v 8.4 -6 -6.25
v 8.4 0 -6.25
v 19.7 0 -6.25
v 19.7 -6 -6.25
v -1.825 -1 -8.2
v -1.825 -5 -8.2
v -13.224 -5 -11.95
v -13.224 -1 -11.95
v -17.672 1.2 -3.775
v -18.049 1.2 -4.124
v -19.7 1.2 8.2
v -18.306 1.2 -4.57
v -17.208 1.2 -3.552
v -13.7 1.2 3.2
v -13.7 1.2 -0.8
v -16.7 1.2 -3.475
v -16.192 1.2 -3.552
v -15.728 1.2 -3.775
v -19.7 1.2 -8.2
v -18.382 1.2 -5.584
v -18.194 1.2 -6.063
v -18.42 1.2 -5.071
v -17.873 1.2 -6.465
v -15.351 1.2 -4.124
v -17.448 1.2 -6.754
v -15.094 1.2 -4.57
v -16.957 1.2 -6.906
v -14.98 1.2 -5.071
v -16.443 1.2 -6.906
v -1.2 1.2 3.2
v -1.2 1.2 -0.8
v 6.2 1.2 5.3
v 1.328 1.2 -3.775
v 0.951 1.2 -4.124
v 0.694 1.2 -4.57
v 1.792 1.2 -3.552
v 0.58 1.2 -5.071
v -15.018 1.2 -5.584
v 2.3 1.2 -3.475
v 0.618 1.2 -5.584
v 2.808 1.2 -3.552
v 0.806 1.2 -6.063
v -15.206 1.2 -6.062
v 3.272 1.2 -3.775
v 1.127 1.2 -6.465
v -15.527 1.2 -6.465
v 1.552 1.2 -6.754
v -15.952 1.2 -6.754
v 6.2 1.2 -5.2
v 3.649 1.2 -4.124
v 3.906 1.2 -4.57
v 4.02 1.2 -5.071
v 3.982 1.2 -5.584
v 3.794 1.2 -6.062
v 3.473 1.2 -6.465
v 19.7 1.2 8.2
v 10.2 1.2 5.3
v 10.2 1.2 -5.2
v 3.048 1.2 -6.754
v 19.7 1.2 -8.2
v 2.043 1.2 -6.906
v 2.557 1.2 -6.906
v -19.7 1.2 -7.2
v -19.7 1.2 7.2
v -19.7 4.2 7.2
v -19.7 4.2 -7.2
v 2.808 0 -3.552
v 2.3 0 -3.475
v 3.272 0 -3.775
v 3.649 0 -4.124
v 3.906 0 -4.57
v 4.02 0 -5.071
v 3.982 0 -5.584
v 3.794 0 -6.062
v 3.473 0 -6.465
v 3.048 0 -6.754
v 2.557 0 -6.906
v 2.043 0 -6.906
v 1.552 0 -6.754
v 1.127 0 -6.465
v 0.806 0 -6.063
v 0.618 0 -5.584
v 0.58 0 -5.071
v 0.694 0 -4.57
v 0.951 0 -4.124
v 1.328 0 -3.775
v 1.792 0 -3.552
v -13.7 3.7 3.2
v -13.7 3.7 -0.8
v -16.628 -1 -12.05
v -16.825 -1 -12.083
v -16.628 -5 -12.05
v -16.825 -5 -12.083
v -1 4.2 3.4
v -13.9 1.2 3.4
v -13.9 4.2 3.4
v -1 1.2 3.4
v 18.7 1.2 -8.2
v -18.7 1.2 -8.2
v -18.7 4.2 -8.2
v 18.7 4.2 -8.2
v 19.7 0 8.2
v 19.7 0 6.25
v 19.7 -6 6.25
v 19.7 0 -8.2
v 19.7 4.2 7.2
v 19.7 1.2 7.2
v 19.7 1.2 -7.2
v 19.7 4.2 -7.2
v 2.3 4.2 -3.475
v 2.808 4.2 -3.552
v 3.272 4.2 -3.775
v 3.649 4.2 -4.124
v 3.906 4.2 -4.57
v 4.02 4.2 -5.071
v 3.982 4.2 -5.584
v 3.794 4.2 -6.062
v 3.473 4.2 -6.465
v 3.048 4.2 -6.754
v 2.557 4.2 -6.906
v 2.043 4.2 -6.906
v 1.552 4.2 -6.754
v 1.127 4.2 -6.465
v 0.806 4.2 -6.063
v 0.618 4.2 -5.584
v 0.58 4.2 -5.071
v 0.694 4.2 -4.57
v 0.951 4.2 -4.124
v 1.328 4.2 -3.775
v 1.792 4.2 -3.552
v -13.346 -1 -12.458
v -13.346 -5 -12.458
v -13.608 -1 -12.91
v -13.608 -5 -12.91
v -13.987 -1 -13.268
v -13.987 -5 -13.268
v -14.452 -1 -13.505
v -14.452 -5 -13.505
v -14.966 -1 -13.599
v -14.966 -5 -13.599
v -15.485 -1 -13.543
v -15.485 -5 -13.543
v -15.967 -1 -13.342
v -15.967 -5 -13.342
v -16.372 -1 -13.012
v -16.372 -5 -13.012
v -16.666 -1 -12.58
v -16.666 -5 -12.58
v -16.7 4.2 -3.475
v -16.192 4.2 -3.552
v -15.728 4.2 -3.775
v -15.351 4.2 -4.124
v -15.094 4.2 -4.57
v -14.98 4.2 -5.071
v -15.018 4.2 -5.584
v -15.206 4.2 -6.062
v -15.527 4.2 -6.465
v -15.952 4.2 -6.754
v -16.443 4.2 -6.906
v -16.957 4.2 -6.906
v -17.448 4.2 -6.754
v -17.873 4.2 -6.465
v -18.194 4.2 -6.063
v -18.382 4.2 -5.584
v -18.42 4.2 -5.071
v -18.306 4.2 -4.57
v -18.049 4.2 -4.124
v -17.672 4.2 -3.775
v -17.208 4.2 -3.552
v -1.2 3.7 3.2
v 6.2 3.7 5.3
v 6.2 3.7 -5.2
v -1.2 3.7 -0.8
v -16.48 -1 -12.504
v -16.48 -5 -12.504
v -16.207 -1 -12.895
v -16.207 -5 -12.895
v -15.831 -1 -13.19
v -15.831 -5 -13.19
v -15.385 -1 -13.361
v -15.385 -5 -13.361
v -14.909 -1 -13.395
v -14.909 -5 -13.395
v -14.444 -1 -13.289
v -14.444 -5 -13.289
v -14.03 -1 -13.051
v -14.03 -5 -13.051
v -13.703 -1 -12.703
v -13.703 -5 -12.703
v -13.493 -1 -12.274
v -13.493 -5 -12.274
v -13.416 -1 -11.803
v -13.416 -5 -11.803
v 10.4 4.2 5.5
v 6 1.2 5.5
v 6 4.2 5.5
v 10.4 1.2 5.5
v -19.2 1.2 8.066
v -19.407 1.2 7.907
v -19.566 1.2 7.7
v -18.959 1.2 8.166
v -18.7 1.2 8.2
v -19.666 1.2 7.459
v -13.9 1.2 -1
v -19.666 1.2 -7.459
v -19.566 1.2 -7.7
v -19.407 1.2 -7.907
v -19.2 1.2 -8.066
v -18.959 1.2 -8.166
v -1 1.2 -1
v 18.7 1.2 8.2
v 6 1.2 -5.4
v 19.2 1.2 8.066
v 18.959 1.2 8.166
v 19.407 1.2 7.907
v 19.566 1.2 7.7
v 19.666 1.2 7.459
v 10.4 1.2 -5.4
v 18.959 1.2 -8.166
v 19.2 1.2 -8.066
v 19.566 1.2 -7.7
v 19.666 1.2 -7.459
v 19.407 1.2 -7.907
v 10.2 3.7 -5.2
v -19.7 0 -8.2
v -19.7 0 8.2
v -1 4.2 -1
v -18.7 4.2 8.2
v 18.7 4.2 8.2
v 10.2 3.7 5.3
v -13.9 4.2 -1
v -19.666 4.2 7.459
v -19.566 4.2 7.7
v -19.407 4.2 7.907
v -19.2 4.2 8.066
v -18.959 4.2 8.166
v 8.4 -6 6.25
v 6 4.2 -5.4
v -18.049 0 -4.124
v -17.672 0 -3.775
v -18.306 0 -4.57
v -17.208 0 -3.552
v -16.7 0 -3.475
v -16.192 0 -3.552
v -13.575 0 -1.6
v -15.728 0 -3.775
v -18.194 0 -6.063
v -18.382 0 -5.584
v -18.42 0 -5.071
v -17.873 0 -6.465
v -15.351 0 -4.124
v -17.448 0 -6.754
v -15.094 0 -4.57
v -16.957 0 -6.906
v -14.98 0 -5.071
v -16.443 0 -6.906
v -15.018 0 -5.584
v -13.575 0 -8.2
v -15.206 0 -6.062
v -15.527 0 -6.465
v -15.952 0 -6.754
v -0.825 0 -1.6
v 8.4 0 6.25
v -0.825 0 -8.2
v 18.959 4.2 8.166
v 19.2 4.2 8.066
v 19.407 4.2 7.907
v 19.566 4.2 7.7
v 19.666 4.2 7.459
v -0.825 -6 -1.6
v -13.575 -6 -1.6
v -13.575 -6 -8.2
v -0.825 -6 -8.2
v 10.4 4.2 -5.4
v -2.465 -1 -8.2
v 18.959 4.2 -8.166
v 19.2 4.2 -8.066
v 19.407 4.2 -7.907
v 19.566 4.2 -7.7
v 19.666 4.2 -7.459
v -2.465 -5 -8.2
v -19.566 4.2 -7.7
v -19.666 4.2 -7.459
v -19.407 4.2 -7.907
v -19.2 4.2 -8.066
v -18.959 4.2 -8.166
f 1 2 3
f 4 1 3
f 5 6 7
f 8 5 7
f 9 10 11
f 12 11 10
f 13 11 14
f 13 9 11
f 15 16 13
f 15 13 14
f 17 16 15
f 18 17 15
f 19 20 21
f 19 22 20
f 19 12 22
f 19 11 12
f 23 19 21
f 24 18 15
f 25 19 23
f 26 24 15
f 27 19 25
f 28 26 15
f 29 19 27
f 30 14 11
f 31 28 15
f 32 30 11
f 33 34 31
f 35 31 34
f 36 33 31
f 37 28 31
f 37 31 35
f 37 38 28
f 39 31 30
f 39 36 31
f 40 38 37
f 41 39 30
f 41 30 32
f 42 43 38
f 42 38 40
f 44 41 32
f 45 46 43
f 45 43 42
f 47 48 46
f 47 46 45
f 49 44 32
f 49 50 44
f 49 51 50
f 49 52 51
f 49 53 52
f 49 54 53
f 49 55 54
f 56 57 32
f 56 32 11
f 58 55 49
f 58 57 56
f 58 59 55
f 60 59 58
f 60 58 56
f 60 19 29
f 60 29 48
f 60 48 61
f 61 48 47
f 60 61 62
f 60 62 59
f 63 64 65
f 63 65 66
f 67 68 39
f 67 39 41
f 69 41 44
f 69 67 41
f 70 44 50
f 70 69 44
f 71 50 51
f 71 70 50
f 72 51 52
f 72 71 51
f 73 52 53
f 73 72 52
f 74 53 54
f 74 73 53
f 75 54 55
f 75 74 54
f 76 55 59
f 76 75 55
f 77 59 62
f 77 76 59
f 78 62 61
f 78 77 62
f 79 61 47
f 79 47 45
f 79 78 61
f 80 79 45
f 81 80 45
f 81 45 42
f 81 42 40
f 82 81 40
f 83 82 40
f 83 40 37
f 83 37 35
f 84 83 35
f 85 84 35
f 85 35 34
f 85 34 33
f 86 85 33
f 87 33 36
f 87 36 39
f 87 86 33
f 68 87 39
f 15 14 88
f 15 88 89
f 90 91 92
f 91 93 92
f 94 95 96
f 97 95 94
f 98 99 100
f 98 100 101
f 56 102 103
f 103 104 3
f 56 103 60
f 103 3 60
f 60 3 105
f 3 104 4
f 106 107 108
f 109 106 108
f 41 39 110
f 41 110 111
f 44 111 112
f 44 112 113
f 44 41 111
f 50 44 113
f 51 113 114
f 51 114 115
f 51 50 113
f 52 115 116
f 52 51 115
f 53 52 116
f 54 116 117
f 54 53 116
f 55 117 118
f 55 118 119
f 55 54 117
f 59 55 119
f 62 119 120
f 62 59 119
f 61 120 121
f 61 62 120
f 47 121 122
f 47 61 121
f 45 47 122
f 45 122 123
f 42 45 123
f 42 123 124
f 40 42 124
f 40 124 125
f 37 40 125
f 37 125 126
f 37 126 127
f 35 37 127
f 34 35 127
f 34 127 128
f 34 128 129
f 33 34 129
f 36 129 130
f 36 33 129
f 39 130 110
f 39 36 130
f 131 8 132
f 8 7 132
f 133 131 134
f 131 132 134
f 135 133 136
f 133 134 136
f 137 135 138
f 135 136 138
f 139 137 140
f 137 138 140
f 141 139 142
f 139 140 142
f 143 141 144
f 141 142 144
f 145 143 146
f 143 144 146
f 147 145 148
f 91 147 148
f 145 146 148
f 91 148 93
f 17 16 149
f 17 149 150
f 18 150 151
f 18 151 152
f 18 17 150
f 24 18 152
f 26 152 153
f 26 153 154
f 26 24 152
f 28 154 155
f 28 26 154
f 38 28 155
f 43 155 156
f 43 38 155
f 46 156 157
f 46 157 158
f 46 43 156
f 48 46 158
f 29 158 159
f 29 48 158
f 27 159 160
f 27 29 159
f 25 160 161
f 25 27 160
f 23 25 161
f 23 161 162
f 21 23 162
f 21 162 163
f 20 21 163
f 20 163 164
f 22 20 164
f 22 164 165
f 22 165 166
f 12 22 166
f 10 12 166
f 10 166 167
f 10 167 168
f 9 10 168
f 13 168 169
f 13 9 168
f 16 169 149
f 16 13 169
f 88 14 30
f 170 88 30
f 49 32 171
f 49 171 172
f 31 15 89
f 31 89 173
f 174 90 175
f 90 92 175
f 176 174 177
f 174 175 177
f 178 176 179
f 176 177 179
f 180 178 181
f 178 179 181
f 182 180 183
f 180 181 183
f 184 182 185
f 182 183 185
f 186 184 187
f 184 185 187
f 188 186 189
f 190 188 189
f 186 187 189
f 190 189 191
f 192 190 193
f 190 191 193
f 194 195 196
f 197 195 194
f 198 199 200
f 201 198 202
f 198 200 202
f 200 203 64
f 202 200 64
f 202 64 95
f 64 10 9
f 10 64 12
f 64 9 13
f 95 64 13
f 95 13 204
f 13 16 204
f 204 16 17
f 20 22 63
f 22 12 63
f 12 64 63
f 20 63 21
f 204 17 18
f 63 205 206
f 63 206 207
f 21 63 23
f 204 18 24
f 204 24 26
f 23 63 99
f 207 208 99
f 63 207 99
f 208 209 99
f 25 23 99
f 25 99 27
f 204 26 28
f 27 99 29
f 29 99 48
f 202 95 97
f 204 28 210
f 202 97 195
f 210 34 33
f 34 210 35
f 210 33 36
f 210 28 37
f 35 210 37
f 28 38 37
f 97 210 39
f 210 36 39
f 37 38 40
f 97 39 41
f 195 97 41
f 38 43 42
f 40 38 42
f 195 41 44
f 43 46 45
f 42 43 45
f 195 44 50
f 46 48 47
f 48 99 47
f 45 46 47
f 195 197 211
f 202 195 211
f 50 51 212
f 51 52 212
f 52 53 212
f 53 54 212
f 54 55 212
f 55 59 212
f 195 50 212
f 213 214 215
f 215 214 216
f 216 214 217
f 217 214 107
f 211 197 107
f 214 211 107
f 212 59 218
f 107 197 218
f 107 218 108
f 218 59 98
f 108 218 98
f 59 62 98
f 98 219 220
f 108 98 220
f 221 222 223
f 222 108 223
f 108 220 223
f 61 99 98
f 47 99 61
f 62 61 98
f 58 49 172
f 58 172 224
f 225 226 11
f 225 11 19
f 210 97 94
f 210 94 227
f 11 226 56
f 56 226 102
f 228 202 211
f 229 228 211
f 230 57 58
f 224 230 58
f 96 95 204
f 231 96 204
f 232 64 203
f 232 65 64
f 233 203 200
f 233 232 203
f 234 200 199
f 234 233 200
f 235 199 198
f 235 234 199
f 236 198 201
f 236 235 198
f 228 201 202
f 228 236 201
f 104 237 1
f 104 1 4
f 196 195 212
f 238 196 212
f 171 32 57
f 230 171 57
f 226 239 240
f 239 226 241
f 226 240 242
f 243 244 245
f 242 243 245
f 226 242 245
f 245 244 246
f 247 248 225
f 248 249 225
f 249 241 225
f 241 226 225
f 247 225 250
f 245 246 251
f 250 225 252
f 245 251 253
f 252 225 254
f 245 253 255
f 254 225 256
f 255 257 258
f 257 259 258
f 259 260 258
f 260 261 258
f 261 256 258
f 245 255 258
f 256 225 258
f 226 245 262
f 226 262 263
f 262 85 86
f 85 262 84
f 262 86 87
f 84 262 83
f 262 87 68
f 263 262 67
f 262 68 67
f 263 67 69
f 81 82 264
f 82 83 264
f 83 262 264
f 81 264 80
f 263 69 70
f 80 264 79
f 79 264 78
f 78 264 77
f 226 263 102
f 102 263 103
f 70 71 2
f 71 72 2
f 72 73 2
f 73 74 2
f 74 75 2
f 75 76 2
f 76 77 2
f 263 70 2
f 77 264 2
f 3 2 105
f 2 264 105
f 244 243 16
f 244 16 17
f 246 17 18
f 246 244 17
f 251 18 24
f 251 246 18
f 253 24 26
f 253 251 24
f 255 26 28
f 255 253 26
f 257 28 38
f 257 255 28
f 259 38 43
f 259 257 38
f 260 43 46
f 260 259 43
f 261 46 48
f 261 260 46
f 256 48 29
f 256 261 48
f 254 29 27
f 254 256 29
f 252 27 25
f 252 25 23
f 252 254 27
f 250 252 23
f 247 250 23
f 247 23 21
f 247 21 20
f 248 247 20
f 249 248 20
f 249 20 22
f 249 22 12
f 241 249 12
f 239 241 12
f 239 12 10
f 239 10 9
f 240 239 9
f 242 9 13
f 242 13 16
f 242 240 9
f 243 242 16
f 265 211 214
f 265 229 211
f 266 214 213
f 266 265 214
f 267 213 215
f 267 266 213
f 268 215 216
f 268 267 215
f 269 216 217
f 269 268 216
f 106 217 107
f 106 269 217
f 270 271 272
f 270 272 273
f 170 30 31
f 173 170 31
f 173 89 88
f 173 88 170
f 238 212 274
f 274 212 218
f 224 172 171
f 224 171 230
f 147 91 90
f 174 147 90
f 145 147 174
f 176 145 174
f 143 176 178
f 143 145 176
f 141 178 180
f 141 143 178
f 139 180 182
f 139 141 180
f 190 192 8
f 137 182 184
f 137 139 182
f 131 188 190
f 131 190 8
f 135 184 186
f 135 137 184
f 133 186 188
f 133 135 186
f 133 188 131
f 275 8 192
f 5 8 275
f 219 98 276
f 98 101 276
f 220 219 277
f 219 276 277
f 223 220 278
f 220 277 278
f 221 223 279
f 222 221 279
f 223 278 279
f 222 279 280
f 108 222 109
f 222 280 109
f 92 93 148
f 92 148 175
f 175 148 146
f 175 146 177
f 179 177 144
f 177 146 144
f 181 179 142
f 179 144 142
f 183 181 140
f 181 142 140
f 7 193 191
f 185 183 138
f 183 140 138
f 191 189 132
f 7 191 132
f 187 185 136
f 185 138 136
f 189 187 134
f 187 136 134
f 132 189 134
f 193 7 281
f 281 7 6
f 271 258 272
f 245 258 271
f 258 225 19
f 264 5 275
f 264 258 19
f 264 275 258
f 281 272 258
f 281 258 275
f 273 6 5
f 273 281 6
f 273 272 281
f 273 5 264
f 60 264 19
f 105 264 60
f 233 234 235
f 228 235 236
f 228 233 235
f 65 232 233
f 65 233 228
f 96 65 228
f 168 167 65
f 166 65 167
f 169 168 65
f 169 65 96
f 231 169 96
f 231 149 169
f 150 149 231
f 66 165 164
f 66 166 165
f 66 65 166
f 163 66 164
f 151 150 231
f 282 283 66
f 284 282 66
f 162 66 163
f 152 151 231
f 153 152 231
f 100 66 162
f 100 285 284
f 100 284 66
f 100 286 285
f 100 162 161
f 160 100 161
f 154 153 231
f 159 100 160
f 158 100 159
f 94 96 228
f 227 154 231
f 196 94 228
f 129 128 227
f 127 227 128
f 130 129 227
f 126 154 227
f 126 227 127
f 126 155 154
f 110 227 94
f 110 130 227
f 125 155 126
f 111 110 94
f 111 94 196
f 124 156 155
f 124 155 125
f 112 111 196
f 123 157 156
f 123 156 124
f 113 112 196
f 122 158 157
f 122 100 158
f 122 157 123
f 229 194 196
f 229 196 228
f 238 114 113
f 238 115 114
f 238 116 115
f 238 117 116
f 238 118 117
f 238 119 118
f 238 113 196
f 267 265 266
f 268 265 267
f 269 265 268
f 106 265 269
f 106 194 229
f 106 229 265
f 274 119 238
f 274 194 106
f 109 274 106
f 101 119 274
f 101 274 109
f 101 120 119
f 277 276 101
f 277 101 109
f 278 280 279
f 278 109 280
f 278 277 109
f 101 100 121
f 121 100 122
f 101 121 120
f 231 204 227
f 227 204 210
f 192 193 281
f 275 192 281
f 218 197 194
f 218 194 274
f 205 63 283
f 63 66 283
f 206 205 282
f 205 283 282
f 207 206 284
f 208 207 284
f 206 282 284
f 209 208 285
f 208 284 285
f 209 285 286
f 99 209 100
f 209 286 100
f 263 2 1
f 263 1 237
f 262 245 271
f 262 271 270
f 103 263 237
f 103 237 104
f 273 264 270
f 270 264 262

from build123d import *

# Parameters (mm, degrees)
SKETCH1_W           = 39.4
SKETCH1_H           = 16.4
SKETCH1_R           = 1.725
BOSS_EXTRUDE1_DEPTH = 1.2
SKETCH2_W           = 12.5
SKETCH2_H           = 4
SKETCH2_W_2         = 4
SKETCH2_H_2         = 10.5
BOSS_EXTRUDE2_DEPTH = 2.5
SKETCH3_W           = 11.3
SKETCH3_H           = 12.5
SKETCH3_W_2         = 12.75
SKETCH3_H_2         = 6.6
BOSS_EXTRUDE3_DEPTH = 6
BOSS_EXTRUDE4_DEPTH = 2
SKETCH5_W           = 39.4
SKETCH5_H           = 16.4
SKETCH5_R           = 1.725
SKETCH5_W_2         = 12.9
SKETCH5_H_2         = 4.4
SKETCH5_W_3         = 4.4
SKETCH5_H_3         = 10.9
BOSS_EXTRUDE5_DEPTH = 3
FILLET1_R           = 1


with BuildPart() as part:
    # Sketch1 → Boss-Extrude1 (new body)
    with BuildSketch(Plane(origin=(0, 0, 0), x_dir=(1, 0, 0), z_dir=(0, 1, 0))):
        Rectangle(SKETCH1_W, SKETCH1_H)
        with Locations(Location((-16.7, 5.2, 0), (0, 0, 270))):
            Circle(SKETCH1_R, mode=Mode.SUBTRACT)
        with Locations(Location((2.3, 5.2, 0), (0, 0, 270))):
            Circle(SKETCH1_R, mode=Mode.SUBTRACT)
    extrude(amount=BOSS_EXTRUDE1_DEPTH)

    # Sketch2 → Boss-Extrude2 (add)
    with BuildSketch(Plane(origin=(0, 1.2, 0), x_dir=(1, 0, 0), z_dir=(0, 1, 0))):
        with Locations((-7.45, -1.2)):
            Rectangle(SKETCH2_W, SKETCH2_H)
        with Locations((8.2, -0.05)):
            Rectangle(SKETCH2_W_2, SKETCH2_H_2)
    extrude(amount=BOSS_EXTRUDE2_DEPTH)

    # Sketch3 → Boss-Extrude3 (add)
    with BuildSketch(Plane.XZ):
        with Locations((14.05, 0)):
            Rectangle(SKETCH3_W, SKETCH3_H)
        with Locations((-7.2, -4.9)):
            Rectangle(SKETCH3_W_2, SKETCH3_H_2)
    extrude(amount=BOSS_EXTRUDE3_DEPTH)

    # Sketch4 → Boss-Extrude4 (add, symmetric)
    with BuildSketch(Plane(origin=(0, -3, 0), x_dir=(-1, 0, 0), z_dir=(0, -1, 0))):
        with BuildLine():
            Line((1.825, 8.2), (13.224013115, 11.95))
            ThreePointArc((13.224013115, 11.95), (14.96605462, 13.598761551), (16.825, 12.083028945))
            Line((16.825, 12.083028945), (16.627742085, 12.050024171))
            ThreePointArc((16.627742085, 12.050024171), (14.909005352, 13.395228648), (13.416459603, 11.802765704))
            Line((13.416459603, 11.802765704), (2.465, 8.2))
            Line((2.465, 8.2), (1.825, 8.2))
        make_face()
    extrude(amount=BOSS_EXTRUDE4_DEPTH, both=True)


with BuildPart() as body_2:
    # Sketch5 → Boss-Extrude5 (new body)
    with BuildSketch(Plane(origin=(0, 1.2, 0), x_dir=(1, 0, 0), z_dir=(0, 1, 0))):
        Rectangle(SKETCH5_W, SKETCH5_H)
        with Locations(Location((2.3, 5.2, 0), (0, 0, 270))):
            Circle(SKETCH5_R, mode=Mode.SUBTRACT)
        with Locations(Location((-16.7, 5.2, 0), (0, 0, 270))):
            Circle(SKETCH5_R, mode=Mode.SUBTRACT)
        with Locations((-7.45, -1.2)):
            Rectangle(SKETCH5_W_2, SKETCH5_H_2, mode=Mode.SUBTRACT)
        with Locations((8.2, -0.05)):
            Rectangle(SKETCH5_W_3, SKETCH5_H_3, mode=Mode.SUBTRACT)
    extrude(amount=BOSS_EXTRUDE5_DEPTH)

    # Fillet1
    fillet1_edges = [body_2.edges().sort_by_distance(p)[0] for p in [
        (19.7, 2.7, -8.2),
        (19.7, 2.7, 8.2),
        (-19.7, 2.7, 8.2),
        (-19.7, 2.7, -8.2),
    ]]
    fillet(fillet1_edges, radius=FILLET1_R)


solid = Compound([part.part, body_2.part])
